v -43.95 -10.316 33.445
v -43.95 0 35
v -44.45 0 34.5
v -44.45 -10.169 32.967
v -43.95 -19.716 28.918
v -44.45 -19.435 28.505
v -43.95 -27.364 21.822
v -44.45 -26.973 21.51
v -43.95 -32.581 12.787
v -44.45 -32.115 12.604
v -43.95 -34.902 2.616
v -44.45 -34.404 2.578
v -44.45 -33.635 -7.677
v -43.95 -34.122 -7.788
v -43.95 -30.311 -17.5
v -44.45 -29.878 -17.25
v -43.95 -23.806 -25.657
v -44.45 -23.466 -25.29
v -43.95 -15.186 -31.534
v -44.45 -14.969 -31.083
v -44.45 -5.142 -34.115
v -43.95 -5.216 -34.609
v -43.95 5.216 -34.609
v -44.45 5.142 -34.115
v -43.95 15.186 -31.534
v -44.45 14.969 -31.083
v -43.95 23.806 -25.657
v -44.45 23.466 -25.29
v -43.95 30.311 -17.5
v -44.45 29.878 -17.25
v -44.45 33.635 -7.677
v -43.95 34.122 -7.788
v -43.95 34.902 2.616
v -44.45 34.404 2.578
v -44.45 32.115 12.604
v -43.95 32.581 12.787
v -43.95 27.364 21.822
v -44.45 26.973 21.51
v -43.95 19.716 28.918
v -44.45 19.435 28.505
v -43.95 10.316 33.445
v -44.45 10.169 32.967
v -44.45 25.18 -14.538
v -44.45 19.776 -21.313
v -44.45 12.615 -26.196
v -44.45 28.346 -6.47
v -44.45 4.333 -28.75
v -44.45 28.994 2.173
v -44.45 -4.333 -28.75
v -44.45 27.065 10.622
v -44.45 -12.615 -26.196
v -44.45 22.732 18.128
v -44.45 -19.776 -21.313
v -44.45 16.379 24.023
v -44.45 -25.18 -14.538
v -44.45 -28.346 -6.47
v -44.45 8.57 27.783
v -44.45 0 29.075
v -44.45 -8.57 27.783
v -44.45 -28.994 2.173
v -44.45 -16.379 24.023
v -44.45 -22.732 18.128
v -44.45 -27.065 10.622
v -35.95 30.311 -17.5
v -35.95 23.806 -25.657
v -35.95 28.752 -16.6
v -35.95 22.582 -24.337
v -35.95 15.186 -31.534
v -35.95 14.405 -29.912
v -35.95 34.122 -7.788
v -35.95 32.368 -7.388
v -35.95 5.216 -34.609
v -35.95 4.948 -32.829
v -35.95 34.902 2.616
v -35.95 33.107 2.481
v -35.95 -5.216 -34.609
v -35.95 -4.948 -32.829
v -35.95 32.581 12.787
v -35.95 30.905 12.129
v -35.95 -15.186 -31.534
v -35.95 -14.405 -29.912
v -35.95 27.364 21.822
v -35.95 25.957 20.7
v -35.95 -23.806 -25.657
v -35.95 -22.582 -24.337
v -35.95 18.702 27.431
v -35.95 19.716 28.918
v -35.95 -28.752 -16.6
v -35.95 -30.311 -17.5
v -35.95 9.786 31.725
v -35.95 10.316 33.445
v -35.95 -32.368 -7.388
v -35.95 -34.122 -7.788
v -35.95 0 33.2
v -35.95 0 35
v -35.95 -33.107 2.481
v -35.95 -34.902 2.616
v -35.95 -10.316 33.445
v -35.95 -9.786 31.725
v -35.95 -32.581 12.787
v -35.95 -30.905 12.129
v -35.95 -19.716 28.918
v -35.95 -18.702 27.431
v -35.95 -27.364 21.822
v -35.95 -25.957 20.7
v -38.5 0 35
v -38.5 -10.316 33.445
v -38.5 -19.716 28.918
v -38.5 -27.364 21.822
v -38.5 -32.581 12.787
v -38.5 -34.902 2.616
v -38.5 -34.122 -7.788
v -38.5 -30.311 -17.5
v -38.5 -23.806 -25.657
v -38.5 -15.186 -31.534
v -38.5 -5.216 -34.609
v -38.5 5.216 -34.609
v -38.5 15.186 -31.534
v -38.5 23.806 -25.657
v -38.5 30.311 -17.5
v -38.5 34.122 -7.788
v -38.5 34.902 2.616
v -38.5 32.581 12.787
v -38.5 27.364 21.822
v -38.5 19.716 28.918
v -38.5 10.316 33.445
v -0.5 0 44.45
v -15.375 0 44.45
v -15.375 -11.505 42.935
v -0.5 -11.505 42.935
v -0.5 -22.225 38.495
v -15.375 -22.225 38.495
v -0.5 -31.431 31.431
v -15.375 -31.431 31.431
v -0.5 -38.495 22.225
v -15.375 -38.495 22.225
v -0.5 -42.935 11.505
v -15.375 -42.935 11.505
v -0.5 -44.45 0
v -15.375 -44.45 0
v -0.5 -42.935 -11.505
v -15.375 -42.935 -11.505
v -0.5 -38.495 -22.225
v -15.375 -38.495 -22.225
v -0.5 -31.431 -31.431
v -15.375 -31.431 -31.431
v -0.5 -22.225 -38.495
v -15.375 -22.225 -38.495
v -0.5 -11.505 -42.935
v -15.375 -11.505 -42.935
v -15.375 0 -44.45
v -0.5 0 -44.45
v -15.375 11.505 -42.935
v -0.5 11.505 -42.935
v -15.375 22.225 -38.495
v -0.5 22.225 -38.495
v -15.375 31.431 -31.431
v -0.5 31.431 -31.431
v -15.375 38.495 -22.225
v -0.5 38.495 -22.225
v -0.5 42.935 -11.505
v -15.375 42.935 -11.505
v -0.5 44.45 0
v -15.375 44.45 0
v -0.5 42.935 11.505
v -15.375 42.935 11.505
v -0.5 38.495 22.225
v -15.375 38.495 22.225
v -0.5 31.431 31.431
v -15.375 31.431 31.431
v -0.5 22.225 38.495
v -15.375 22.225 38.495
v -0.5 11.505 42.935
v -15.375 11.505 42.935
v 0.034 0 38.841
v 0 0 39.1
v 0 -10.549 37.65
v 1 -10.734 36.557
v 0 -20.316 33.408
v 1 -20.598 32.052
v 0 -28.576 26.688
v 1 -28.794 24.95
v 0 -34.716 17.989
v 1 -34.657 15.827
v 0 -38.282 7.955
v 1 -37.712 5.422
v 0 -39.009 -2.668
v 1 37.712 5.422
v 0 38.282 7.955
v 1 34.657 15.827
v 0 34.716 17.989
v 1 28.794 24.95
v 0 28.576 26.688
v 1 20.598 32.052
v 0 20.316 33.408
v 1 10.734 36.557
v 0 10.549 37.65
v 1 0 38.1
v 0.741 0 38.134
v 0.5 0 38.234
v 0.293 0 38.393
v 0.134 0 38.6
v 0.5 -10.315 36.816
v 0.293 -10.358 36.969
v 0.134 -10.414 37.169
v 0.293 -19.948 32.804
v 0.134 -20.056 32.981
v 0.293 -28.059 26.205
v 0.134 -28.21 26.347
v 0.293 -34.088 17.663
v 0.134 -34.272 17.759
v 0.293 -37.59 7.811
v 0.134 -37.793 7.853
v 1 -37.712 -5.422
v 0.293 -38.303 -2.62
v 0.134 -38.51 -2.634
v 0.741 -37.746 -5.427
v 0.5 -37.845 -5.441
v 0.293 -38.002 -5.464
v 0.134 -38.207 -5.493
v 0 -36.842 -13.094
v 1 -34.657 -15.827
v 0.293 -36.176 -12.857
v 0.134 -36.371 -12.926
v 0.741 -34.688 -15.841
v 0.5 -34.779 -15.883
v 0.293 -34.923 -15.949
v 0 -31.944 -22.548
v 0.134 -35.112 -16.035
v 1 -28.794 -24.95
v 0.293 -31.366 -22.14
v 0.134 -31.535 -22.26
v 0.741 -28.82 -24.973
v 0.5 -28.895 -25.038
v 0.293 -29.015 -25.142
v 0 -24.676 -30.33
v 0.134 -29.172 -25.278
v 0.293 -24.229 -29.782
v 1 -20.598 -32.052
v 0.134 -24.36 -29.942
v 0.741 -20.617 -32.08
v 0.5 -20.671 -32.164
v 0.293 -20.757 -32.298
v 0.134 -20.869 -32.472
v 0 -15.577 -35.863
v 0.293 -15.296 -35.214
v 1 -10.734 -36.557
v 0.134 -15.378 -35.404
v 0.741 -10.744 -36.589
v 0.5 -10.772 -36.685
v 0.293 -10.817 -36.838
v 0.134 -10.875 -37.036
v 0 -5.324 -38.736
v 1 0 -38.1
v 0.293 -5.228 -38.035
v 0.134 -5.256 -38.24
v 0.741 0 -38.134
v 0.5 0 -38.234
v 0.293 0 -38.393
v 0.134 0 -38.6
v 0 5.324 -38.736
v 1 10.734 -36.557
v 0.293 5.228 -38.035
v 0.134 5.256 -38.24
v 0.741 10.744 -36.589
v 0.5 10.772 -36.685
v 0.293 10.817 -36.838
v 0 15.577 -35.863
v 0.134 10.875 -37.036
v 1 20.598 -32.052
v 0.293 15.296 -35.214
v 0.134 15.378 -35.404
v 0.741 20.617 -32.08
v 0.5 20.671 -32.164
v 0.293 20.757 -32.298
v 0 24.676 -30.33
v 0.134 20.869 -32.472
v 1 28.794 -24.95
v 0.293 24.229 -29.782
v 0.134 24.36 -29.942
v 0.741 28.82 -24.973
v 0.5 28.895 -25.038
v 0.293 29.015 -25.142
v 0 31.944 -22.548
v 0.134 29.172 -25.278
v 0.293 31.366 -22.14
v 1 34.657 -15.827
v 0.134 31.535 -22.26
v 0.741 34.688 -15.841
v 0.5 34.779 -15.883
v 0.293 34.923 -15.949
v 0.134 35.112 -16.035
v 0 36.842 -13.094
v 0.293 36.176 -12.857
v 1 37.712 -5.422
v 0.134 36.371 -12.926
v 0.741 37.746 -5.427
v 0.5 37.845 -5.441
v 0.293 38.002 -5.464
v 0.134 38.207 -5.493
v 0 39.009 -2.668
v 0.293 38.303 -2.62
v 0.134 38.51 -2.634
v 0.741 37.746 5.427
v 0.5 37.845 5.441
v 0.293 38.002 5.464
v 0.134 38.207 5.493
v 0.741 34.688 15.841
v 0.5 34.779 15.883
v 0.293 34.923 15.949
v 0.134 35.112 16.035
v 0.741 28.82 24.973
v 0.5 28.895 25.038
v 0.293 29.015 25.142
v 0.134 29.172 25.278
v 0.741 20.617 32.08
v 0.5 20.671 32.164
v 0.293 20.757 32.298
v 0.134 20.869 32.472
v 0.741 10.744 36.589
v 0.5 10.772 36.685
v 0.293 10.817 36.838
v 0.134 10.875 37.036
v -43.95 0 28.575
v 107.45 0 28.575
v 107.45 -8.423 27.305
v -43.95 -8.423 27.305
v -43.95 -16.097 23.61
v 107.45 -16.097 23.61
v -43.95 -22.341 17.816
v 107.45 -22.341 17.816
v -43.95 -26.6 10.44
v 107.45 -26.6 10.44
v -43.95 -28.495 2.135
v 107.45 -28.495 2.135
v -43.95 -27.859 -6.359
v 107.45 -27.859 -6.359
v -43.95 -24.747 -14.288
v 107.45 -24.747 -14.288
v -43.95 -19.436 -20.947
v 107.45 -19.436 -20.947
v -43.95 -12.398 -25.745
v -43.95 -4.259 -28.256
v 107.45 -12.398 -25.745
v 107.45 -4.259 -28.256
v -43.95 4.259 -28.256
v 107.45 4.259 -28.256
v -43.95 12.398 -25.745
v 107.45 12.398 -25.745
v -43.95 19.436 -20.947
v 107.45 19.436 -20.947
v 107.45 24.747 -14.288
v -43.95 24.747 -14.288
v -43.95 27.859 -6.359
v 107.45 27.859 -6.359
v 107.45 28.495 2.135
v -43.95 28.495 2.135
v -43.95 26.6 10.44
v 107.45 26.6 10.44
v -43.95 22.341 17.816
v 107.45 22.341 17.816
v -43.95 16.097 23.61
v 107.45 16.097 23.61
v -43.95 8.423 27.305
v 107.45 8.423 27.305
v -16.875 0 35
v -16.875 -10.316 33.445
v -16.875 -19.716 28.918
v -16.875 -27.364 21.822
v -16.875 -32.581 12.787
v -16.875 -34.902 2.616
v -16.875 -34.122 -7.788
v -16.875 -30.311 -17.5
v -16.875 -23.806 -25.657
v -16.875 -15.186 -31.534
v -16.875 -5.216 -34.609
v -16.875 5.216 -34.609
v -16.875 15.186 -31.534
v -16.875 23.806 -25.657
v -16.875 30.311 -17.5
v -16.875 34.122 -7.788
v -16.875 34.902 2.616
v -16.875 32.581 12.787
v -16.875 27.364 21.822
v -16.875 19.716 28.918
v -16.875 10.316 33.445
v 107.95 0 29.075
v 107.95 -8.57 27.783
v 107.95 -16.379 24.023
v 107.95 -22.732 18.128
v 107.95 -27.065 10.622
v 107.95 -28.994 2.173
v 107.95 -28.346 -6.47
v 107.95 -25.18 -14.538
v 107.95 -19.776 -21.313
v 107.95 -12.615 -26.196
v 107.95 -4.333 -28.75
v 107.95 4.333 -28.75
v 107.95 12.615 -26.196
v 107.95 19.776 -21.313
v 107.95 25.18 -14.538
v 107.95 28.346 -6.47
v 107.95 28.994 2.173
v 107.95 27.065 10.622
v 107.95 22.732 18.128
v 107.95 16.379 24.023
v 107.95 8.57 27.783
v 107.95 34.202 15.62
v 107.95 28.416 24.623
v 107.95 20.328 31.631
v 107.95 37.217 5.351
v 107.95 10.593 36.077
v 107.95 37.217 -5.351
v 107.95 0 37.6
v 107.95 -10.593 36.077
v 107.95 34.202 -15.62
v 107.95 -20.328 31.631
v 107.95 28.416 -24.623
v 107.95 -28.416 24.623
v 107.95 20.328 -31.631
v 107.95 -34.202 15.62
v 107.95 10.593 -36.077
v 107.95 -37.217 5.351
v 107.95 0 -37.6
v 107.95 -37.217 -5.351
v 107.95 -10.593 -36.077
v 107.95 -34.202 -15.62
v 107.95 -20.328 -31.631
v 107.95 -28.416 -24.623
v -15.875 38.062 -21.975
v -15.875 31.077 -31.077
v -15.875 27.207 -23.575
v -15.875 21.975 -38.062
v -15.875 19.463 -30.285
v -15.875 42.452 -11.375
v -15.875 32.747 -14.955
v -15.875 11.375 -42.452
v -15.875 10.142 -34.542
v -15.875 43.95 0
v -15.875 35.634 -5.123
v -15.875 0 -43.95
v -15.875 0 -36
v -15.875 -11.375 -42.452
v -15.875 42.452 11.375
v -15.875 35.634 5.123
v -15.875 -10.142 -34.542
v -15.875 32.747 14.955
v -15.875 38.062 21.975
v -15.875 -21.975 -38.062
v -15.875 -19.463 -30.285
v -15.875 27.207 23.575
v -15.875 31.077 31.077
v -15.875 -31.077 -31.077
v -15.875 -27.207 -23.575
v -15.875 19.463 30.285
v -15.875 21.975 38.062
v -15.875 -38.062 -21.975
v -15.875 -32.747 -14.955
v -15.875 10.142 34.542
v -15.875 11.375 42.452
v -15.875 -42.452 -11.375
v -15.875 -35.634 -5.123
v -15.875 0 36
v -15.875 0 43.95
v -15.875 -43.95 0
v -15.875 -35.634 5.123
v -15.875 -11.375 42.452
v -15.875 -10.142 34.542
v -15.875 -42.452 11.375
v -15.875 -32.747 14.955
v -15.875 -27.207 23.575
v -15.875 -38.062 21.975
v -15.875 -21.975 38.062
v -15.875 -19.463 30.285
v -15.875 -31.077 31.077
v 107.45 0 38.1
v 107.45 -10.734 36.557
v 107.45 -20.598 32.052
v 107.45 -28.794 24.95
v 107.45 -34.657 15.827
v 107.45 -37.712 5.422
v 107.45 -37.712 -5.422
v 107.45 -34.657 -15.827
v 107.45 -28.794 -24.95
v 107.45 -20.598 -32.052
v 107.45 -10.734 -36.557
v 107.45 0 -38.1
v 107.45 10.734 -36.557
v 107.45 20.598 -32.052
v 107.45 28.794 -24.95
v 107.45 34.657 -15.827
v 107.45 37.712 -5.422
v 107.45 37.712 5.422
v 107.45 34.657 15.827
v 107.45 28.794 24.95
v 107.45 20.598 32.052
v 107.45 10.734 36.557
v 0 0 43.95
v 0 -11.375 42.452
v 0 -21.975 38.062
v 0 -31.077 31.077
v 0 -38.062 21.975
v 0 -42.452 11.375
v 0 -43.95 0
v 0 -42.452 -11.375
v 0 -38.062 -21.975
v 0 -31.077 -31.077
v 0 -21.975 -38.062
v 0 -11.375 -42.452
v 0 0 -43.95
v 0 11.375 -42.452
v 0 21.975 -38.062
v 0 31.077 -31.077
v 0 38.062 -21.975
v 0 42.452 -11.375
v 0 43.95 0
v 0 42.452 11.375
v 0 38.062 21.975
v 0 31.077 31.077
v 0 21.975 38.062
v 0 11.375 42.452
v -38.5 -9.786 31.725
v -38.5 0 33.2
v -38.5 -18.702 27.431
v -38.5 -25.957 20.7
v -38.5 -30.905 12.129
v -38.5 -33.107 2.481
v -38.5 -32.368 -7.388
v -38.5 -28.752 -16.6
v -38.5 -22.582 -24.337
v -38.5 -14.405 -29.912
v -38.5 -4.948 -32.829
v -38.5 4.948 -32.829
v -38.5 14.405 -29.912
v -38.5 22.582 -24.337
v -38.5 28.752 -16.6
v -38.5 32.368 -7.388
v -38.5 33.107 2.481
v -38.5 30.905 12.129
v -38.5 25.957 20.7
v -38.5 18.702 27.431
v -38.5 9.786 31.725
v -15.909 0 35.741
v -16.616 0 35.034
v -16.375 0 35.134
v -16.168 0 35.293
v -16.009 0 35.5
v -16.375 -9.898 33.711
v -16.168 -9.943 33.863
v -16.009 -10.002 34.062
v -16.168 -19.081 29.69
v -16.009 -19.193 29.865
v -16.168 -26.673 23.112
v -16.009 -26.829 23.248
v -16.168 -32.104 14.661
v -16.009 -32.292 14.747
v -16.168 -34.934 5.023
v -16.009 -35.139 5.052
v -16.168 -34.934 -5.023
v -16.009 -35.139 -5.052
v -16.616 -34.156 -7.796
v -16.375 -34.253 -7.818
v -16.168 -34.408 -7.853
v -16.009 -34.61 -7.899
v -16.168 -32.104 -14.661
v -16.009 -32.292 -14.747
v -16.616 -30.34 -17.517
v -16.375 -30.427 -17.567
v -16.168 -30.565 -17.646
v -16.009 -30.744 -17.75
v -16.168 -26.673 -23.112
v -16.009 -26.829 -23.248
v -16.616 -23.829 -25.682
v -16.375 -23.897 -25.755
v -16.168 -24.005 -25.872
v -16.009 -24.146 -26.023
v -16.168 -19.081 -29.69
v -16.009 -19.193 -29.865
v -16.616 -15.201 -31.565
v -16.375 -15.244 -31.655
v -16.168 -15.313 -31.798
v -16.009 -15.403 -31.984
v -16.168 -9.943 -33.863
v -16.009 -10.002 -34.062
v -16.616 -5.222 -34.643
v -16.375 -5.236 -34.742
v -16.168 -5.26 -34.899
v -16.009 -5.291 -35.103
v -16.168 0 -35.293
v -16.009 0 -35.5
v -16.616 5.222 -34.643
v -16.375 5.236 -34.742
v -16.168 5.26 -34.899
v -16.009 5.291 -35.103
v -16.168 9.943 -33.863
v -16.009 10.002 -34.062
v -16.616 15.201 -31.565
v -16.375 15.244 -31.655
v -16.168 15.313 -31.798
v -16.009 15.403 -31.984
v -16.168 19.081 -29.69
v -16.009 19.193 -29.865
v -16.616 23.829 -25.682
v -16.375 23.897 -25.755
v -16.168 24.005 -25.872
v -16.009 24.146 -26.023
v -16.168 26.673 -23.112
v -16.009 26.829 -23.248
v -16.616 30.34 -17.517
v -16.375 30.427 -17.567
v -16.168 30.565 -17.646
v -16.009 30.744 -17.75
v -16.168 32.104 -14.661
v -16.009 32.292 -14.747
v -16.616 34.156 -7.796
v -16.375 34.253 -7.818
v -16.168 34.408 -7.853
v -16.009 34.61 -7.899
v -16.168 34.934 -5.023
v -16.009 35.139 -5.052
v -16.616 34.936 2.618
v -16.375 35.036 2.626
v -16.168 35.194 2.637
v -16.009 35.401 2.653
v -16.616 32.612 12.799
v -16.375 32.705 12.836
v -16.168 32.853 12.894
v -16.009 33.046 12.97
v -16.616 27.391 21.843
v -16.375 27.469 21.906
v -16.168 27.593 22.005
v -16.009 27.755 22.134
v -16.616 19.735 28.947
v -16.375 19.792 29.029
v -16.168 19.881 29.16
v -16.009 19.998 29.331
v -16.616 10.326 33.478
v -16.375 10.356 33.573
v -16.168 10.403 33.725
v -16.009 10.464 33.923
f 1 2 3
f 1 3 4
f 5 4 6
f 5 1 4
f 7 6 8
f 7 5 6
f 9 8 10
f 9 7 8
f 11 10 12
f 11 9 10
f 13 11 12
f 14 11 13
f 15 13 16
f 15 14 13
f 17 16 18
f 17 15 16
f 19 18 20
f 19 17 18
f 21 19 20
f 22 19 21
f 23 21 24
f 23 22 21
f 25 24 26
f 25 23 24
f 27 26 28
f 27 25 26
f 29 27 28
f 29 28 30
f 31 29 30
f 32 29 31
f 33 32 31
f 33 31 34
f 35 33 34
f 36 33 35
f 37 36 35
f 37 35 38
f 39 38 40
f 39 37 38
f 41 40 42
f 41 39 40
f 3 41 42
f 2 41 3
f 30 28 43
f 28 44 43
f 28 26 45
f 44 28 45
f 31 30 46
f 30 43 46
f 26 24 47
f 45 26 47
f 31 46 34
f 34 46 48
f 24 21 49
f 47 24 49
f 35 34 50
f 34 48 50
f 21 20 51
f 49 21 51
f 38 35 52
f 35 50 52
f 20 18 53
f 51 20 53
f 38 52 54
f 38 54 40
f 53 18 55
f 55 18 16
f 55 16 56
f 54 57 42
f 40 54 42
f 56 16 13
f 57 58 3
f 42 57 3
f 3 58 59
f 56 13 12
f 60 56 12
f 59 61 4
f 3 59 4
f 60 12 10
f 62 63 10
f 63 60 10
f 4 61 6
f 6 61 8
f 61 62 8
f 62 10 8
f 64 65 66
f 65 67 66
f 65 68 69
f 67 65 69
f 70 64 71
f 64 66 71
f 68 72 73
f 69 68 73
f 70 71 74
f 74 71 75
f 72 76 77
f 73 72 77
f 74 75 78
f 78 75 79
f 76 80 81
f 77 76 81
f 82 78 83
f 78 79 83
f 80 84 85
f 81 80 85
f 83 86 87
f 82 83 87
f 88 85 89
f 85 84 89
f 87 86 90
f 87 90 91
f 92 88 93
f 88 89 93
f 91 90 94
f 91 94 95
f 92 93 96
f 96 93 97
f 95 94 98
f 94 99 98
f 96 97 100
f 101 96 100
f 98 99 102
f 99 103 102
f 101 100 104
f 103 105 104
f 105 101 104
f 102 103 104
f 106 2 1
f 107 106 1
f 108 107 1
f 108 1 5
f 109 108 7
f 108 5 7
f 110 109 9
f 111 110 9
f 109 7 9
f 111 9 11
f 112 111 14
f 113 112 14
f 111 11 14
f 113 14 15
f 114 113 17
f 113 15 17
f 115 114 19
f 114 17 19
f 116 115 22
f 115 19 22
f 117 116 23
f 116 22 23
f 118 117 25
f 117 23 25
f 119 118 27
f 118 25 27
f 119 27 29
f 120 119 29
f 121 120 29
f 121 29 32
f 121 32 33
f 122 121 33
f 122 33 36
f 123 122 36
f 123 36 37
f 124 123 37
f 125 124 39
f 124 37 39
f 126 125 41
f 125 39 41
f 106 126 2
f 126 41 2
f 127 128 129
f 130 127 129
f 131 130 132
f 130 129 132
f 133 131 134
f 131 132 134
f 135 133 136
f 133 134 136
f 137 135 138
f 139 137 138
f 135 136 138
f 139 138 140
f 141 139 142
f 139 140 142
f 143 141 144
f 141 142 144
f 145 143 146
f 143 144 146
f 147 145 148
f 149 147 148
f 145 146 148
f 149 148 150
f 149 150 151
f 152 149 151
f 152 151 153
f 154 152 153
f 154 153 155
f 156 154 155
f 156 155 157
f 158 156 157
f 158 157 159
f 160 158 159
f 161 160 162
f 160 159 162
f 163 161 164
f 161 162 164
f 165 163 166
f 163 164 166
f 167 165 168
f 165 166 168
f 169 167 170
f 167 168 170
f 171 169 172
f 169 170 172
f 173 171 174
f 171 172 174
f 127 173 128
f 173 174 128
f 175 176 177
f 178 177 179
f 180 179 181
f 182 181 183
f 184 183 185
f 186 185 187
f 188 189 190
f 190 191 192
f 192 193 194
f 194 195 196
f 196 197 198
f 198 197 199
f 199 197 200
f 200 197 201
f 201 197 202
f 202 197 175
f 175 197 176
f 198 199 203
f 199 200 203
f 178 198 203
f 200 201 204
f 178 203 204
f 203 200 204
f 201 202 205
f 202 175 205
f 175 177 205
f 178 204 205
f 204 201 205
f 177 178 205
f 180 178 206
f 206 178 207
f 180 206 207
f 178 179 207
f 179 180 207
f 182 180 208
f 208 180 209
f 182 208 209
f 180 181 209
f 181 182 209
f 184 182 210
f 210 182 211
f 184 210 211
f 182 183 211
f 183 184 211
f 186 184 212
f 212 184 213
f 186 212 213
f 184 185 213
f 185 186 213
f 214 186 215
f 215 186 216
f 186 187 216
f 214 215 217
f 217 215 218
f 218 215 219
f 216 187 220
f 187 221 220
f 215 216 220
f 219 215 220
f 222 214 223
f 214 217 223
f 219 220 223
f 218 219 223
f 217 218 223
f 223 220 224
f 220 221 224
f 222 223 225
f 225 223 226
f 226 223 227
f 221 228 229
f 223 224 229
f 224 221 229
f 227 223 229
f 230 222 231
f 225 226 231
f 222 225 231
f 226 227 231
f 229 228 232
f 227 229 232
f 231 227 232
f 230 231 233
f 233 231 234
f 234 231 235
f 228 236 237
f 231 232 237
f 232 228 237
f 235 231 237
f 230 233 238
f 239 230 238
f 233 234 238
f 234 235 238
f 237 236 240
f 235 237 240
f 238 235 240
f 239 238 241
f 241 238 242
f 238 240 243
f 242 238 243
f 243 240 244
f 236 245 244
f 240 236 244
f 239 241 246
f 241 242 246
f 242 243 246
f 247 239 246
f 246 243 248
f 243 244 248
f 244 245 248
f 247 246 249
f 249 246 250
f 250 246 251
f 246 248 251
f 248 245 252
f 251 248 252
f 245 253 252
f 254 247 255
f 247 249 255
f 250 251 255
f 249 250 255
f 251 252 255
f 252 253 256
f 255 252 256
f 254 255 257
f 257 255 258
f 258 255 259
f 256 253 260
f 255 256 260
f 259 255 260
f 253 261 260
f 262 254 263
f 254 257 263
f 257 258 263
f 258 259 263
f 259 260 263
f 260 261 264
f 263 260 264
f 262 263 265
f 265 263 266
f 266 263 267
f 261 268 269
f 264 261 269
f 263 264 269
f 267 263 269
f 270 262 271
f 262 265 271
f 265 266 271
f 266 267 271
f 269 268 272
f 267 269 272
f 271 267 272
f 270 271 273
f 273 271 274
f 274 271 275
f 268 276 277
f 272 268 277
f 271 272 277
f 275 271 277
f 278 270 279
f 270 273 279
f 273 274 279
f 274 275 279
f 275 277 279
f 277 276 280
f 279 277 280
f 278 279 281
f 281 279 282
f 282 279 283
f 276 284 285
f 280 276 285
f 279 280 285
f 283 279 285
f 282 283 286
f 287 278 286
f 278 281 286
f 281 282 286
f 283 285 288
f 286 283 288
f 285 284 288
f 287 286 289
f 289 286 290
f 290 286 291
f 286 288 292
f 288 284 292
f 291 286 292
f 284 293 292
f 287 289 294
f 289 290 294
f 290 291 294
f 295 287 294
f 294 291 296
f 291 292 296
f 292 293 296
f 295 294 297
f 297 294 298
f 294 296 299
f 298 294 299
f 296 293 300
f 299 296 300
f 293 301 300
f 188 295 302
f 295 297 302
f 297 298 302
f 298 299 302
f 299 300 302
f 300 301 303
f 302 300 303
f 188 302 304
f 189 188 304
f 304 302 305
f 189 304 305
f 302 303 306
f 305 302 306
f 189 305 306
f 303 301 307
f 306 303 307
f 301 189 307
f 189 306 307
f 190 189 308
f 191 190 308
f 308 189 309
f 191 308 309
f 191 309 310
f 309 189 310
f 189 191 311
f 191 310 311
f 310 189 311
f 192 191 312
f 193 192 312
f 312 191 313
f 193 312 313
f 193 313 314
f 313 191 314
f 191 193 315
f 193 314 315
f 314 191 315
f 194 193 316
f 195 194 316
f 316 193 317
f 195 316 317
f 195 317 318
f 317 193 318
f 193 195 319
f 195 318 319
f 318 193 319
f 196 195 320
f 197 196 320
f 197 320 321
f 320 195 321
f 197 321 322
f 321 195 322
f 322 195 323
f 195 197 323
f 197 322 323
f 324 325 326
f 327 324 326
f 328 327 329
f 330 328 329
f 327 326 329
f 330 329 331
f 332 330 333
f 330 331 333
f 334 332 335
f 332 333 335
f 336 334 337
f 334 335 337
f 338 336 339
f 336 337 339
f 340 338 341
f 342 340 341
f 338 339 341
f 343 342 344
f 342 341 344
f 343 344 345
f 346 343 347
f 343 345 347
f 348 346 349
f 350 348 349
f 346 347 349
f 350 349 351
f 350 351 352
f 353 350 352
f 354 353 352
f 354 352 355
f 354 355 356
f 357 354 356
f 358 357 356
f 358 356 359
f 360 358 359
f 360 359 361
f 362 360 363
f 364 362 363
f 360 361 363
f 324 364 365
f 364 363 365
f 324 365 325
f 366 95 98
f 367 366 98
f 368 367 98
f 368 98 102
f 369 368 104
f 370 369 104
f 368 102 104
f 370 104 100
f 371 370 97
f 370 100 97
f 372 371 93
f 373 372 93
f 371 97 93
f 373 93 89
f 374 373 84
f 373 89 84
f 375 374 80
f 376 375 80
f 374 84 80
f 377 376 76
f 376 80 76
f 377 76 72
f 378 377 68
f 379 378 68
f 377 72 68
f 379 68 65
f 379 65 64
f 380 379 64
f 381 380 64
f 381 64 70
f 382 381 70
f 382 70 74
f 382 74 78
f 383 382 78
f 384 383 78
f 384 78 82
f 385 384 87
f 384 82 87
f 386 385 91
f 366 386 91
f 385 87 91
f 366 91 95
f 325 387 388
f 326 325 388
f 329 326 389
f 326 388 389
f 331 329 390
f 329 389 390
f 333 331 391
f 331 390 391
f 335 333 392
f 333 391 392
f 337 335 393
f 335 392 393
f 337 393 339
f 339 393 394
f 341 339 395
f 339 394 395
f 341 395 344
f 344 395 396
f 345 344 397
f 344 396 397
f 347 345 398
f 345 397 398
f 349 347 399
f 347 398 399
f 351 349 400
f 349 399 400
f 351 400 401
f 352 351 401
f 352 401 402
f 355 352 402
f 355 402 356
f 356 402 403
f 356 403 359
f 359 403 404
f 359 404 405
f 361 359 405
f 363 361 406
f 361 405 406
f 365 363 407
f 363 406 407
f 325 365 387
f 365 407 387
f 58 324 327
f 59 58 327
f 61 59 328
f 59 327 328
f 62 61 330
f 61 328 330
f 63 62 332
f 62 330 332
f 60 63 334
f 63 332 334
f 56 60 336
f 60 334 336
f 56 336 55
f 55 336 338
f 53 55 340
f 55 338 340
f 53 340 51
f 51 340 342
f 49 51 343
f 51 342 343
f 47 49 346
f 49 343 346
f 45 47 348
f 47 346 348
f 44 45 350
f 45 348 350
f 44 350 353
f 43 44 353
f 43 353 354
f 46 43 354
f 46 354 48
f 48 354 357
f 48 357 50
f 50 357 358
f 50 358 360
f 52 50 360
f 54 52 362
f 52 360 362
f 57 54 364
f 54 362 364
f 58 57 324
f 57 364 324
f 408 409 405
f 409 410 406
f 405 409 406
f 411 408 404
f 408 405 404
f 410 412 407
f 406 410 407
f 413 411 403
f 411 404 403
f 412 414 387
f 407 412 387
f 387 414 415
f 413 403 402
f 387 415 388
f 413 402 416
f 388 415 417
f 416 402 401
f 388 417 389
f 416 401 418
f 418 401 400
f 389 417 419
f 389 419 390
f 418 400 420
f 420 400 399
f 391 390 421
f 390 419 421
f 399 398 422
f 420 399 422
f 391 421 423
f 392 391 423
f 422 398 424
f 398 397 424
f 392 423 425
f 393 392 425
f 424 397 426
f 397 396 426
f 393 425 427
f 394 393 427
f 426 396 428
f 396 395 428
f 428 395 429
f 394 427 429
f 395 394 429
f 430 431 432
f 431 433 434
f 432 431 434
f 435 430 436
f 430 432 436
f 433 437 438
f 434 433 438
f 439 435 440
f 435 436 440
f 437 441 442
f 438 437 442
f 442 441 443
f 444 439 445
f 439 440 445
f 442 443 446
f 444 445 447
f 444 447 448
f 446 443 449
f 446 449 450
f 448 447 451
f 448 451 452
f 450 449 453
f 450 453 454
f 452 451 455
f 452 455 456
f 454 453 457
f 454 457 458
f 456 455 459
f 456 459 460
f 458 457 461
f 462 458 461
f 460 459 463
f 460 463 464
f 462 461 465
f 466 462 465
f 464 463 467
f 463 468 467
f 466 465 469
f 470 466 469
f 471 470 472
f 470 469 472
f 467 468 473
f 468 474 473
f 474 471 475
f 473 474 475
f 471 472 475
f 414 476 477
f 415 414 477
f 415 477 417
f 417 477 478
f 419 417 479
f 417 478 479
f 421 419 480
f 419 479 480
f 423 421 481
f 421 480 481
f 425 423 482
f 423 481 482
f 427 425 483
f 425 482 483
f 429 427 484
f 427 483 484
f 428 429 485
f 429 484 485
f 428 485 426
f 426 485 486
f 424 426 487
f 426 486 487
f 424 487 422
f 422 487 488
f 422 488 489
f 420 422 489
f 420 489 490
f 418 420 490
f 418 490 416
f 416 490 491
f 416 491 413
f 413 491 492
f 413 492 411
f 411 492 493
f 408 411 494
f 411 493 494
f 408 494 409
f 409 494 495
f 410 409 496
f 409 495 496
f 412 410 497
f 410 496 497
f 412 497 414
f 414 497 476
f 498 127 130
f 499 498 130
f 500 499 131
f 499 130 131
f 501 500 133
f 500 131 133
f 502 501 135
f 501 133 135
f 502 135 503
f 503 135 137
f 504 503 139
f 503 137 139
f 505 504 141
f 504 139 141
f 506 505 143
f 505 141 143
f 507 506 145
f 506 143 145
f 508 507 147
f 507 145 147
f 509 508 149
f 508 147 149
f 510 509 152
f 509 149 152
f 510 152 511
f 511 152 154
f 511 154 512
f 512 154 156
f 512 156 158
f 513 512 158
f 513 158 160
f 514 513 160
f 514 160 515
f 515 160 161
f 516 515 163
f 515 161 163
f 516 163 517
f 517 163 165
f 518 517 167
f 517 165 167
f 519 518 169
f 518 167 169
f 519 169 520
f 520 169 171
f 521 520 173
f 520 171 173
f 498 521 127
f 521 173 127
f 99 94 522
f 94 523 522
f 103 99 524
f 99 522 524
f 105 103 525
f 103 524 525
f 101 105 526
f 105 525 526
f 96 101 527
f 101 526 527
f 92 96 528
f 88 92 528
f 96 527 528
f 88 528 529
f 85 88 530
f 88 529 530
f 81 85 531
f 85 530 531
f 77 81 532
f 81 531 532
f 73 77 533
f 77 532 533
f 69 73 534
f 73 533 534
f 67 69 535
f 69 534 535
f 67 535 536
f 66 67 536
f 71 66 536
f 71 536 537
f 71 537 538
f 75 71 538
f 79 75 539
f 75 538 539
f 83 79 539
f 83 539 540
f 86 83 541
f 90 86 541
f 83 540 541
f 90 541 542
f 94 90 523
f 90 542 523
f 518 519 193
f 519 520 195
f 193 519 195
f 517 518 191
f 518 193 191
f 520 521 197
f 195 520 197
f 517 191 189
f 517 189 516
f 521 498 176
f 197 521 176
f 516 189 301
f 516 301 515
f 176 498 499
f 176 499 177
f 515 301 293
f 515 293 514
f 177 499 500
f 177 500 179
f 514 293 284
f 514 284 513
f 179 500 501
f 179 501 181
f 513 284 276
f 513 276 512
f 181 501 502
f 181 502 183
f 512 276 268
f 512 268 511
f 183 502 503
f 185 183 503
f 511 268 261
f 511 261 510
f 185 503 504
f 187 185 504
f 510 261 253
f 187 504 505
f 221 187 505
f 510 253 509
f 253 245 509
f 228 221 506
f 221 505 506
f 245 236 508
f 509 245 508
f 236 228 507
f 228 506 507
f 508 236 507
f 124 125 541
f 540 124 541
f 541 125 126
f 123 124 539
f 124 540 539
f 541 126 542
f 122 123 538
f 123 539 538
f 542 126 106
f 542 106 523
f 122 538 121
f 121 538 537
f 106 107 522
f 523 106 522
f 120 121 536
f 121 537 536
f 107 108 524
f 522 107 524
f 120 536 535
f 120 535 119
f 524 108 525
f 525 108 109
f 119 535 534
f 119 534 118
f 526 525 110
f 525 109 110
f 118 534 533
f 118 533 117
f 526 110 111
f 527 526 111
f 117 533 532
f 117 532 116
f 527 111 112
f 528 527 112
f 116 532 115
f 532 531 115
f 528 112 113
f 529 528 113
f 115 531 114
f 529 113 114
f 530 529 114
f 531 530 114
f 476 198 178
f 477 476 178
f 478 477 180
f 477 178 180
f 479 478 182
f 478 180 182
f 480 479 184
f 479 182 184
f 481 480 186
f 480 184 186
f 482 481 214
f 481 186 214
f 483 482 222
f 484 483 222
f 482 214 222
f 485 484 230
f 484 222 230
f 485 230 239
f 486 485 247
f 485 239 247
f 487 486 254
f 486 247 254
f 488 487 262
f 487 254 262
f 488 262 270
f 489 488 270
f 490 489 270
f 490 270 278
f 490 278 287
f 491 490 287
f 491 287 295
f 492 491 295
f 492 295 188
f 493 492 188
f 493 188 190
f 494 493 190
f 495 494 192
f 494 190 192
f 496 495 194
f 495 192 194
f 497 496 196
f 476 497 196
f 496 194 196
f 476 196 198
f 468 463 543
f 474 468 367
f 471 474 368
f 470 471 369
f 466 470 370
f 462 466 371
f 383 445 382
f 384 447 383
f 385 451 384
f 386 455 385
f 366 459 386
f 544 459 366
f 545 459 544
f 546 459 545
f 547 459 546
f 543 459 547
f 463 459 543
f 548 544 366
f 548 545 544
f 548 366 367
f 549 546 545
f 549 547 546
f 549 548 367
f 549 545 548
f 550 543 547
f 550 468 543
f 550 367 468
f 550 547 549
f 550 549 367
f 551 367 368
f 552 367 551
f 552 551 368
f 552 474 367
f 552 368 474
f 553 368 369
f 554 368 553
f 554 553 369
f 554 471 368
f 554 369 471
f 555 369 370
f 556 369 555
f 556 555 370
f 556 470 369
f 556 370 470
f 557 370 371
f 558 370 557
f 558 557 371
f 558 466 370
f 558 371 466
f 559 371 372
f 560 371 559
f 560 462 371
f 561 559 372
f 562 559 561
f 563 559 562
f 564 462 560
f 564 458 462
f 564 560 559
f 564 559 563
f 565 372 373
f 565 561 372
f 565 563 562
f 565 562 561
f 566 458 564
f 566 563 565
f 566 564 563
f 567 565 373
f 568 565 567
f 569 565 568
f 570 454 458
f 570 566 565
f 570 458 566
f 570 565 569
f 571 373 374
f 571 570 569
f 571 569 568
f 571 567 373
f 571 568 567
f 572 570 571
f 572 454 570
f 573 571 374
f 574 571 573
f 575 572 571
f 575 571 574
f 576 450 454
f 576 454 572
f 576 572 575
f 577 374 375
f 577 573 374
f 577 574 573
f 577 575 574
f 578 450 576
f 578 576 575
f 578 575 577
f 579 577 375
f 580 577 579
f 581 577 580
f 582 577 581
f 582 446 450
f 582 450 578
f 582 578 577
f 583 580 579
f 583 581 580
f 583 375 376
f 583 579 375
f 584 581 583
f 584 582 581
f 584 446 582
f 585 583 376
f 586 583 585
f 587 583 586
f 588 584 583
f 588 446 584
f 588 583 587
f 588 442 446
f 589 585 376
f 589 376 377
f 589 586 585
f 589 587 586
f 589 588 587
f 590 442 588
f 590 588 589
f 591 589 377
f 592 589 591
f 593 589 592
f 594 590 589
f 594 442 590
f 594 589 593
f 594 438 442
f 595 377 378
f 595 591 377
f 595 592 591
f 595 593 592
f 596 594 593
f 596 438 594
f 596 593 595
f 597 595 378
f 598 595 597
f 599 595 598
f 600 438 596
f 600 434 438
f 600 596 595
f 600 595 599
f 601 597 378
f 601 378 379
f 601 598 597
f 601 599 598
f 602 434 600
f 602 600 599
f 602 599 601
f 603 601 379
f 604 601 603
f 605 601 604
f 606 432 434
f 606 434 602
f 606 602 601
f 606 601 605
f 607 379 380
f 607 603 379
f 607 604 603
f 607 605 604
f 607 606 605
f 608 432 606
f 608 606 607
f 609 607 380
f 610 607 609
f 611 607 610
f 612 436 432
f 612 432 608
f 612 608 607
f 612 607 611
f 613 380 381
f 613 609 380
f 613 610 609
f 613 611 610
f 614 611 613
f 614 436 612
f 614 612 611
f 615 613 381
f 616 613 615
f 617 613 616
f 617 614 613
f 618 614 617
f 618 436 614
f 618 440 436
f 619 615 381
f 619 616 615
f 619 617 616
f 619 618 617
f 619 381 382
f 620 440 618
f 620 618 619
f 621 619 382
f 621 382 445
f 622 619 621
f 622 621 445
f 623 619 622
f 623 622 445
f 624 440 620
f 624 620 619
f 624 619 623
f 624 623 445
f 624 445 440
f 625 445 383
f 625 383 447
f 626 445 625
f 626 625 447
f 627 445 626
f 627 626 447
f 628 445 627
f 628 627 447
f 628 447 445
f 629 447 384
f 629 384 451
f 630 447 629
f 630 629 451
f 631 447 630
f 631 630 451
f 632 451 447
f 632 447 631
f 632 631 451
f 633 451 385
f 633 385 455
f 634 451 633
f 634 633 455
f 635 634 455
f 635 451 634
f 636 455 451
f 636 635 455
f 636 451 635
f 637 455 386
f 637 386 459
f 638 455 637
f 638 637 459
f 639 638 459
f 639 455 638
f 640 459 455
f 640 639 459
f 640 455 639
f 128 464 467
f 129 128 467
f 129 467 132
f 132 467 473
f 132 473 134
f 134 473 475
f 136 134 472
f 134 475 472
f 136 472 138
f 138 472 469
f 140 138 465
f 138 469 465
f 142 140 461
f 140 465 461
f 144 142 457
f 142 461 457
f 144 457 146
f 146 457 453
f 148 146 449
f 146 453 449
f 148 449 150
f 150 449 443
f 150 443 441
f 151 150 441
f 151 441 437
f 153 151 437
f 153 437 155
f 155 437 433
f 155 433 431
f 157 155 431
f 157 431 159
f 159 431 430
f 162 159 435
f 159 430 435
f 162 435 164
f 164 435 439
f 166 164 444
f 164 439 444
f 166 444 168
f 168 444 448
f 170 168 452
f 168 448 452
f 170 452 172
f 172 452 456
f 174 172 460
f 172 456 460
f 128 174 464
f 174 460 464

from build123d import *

# Parameters (mm, degrees)
F2_SIZE = 0.5
F3_R    = 1


with BuildPart() as f1:
    # F0 (on Front) → F1 (revolve)
    with BuildSketch(Plane.XZ):
        Polygon((-44.45, 35), (-44.45, 28.575), (107.95, 28.575), (107.95, 38.1), (0, 38.1), (0, 44.45), (-15.875, 44.45), (-15.875, 35), (-35.95, 35), (-35.95, 33.2), (-38.5, 33.2), (-38.5, 35), align=None)
    revolve(axis=Axis((19.276485, 0, 0), (1, 0, 0)))

    # F2
    f2_edges = [f1.edges().sort_by_distance(p)[0] for p in [
        (107.95, 0, -38.1),
        (107.95, 0, -28.575),
        (-44.45, 0, -28.575),
        (-44.45, 0, -35),
        (-15.875, 0, -44.45),
        (0, 0, -44.45),
    ]]
    chamfer(f2_edges, length=F2_SIZE)

    # F3
    f3_edges = [f1.edges().sort_by_distance(p)[0] for p in [
        (-15.875, 0, -35),
        (0, 0, -38.1),
    ]]
    fillet(f3_edges, radius=F3_R)


solid = f1.part
